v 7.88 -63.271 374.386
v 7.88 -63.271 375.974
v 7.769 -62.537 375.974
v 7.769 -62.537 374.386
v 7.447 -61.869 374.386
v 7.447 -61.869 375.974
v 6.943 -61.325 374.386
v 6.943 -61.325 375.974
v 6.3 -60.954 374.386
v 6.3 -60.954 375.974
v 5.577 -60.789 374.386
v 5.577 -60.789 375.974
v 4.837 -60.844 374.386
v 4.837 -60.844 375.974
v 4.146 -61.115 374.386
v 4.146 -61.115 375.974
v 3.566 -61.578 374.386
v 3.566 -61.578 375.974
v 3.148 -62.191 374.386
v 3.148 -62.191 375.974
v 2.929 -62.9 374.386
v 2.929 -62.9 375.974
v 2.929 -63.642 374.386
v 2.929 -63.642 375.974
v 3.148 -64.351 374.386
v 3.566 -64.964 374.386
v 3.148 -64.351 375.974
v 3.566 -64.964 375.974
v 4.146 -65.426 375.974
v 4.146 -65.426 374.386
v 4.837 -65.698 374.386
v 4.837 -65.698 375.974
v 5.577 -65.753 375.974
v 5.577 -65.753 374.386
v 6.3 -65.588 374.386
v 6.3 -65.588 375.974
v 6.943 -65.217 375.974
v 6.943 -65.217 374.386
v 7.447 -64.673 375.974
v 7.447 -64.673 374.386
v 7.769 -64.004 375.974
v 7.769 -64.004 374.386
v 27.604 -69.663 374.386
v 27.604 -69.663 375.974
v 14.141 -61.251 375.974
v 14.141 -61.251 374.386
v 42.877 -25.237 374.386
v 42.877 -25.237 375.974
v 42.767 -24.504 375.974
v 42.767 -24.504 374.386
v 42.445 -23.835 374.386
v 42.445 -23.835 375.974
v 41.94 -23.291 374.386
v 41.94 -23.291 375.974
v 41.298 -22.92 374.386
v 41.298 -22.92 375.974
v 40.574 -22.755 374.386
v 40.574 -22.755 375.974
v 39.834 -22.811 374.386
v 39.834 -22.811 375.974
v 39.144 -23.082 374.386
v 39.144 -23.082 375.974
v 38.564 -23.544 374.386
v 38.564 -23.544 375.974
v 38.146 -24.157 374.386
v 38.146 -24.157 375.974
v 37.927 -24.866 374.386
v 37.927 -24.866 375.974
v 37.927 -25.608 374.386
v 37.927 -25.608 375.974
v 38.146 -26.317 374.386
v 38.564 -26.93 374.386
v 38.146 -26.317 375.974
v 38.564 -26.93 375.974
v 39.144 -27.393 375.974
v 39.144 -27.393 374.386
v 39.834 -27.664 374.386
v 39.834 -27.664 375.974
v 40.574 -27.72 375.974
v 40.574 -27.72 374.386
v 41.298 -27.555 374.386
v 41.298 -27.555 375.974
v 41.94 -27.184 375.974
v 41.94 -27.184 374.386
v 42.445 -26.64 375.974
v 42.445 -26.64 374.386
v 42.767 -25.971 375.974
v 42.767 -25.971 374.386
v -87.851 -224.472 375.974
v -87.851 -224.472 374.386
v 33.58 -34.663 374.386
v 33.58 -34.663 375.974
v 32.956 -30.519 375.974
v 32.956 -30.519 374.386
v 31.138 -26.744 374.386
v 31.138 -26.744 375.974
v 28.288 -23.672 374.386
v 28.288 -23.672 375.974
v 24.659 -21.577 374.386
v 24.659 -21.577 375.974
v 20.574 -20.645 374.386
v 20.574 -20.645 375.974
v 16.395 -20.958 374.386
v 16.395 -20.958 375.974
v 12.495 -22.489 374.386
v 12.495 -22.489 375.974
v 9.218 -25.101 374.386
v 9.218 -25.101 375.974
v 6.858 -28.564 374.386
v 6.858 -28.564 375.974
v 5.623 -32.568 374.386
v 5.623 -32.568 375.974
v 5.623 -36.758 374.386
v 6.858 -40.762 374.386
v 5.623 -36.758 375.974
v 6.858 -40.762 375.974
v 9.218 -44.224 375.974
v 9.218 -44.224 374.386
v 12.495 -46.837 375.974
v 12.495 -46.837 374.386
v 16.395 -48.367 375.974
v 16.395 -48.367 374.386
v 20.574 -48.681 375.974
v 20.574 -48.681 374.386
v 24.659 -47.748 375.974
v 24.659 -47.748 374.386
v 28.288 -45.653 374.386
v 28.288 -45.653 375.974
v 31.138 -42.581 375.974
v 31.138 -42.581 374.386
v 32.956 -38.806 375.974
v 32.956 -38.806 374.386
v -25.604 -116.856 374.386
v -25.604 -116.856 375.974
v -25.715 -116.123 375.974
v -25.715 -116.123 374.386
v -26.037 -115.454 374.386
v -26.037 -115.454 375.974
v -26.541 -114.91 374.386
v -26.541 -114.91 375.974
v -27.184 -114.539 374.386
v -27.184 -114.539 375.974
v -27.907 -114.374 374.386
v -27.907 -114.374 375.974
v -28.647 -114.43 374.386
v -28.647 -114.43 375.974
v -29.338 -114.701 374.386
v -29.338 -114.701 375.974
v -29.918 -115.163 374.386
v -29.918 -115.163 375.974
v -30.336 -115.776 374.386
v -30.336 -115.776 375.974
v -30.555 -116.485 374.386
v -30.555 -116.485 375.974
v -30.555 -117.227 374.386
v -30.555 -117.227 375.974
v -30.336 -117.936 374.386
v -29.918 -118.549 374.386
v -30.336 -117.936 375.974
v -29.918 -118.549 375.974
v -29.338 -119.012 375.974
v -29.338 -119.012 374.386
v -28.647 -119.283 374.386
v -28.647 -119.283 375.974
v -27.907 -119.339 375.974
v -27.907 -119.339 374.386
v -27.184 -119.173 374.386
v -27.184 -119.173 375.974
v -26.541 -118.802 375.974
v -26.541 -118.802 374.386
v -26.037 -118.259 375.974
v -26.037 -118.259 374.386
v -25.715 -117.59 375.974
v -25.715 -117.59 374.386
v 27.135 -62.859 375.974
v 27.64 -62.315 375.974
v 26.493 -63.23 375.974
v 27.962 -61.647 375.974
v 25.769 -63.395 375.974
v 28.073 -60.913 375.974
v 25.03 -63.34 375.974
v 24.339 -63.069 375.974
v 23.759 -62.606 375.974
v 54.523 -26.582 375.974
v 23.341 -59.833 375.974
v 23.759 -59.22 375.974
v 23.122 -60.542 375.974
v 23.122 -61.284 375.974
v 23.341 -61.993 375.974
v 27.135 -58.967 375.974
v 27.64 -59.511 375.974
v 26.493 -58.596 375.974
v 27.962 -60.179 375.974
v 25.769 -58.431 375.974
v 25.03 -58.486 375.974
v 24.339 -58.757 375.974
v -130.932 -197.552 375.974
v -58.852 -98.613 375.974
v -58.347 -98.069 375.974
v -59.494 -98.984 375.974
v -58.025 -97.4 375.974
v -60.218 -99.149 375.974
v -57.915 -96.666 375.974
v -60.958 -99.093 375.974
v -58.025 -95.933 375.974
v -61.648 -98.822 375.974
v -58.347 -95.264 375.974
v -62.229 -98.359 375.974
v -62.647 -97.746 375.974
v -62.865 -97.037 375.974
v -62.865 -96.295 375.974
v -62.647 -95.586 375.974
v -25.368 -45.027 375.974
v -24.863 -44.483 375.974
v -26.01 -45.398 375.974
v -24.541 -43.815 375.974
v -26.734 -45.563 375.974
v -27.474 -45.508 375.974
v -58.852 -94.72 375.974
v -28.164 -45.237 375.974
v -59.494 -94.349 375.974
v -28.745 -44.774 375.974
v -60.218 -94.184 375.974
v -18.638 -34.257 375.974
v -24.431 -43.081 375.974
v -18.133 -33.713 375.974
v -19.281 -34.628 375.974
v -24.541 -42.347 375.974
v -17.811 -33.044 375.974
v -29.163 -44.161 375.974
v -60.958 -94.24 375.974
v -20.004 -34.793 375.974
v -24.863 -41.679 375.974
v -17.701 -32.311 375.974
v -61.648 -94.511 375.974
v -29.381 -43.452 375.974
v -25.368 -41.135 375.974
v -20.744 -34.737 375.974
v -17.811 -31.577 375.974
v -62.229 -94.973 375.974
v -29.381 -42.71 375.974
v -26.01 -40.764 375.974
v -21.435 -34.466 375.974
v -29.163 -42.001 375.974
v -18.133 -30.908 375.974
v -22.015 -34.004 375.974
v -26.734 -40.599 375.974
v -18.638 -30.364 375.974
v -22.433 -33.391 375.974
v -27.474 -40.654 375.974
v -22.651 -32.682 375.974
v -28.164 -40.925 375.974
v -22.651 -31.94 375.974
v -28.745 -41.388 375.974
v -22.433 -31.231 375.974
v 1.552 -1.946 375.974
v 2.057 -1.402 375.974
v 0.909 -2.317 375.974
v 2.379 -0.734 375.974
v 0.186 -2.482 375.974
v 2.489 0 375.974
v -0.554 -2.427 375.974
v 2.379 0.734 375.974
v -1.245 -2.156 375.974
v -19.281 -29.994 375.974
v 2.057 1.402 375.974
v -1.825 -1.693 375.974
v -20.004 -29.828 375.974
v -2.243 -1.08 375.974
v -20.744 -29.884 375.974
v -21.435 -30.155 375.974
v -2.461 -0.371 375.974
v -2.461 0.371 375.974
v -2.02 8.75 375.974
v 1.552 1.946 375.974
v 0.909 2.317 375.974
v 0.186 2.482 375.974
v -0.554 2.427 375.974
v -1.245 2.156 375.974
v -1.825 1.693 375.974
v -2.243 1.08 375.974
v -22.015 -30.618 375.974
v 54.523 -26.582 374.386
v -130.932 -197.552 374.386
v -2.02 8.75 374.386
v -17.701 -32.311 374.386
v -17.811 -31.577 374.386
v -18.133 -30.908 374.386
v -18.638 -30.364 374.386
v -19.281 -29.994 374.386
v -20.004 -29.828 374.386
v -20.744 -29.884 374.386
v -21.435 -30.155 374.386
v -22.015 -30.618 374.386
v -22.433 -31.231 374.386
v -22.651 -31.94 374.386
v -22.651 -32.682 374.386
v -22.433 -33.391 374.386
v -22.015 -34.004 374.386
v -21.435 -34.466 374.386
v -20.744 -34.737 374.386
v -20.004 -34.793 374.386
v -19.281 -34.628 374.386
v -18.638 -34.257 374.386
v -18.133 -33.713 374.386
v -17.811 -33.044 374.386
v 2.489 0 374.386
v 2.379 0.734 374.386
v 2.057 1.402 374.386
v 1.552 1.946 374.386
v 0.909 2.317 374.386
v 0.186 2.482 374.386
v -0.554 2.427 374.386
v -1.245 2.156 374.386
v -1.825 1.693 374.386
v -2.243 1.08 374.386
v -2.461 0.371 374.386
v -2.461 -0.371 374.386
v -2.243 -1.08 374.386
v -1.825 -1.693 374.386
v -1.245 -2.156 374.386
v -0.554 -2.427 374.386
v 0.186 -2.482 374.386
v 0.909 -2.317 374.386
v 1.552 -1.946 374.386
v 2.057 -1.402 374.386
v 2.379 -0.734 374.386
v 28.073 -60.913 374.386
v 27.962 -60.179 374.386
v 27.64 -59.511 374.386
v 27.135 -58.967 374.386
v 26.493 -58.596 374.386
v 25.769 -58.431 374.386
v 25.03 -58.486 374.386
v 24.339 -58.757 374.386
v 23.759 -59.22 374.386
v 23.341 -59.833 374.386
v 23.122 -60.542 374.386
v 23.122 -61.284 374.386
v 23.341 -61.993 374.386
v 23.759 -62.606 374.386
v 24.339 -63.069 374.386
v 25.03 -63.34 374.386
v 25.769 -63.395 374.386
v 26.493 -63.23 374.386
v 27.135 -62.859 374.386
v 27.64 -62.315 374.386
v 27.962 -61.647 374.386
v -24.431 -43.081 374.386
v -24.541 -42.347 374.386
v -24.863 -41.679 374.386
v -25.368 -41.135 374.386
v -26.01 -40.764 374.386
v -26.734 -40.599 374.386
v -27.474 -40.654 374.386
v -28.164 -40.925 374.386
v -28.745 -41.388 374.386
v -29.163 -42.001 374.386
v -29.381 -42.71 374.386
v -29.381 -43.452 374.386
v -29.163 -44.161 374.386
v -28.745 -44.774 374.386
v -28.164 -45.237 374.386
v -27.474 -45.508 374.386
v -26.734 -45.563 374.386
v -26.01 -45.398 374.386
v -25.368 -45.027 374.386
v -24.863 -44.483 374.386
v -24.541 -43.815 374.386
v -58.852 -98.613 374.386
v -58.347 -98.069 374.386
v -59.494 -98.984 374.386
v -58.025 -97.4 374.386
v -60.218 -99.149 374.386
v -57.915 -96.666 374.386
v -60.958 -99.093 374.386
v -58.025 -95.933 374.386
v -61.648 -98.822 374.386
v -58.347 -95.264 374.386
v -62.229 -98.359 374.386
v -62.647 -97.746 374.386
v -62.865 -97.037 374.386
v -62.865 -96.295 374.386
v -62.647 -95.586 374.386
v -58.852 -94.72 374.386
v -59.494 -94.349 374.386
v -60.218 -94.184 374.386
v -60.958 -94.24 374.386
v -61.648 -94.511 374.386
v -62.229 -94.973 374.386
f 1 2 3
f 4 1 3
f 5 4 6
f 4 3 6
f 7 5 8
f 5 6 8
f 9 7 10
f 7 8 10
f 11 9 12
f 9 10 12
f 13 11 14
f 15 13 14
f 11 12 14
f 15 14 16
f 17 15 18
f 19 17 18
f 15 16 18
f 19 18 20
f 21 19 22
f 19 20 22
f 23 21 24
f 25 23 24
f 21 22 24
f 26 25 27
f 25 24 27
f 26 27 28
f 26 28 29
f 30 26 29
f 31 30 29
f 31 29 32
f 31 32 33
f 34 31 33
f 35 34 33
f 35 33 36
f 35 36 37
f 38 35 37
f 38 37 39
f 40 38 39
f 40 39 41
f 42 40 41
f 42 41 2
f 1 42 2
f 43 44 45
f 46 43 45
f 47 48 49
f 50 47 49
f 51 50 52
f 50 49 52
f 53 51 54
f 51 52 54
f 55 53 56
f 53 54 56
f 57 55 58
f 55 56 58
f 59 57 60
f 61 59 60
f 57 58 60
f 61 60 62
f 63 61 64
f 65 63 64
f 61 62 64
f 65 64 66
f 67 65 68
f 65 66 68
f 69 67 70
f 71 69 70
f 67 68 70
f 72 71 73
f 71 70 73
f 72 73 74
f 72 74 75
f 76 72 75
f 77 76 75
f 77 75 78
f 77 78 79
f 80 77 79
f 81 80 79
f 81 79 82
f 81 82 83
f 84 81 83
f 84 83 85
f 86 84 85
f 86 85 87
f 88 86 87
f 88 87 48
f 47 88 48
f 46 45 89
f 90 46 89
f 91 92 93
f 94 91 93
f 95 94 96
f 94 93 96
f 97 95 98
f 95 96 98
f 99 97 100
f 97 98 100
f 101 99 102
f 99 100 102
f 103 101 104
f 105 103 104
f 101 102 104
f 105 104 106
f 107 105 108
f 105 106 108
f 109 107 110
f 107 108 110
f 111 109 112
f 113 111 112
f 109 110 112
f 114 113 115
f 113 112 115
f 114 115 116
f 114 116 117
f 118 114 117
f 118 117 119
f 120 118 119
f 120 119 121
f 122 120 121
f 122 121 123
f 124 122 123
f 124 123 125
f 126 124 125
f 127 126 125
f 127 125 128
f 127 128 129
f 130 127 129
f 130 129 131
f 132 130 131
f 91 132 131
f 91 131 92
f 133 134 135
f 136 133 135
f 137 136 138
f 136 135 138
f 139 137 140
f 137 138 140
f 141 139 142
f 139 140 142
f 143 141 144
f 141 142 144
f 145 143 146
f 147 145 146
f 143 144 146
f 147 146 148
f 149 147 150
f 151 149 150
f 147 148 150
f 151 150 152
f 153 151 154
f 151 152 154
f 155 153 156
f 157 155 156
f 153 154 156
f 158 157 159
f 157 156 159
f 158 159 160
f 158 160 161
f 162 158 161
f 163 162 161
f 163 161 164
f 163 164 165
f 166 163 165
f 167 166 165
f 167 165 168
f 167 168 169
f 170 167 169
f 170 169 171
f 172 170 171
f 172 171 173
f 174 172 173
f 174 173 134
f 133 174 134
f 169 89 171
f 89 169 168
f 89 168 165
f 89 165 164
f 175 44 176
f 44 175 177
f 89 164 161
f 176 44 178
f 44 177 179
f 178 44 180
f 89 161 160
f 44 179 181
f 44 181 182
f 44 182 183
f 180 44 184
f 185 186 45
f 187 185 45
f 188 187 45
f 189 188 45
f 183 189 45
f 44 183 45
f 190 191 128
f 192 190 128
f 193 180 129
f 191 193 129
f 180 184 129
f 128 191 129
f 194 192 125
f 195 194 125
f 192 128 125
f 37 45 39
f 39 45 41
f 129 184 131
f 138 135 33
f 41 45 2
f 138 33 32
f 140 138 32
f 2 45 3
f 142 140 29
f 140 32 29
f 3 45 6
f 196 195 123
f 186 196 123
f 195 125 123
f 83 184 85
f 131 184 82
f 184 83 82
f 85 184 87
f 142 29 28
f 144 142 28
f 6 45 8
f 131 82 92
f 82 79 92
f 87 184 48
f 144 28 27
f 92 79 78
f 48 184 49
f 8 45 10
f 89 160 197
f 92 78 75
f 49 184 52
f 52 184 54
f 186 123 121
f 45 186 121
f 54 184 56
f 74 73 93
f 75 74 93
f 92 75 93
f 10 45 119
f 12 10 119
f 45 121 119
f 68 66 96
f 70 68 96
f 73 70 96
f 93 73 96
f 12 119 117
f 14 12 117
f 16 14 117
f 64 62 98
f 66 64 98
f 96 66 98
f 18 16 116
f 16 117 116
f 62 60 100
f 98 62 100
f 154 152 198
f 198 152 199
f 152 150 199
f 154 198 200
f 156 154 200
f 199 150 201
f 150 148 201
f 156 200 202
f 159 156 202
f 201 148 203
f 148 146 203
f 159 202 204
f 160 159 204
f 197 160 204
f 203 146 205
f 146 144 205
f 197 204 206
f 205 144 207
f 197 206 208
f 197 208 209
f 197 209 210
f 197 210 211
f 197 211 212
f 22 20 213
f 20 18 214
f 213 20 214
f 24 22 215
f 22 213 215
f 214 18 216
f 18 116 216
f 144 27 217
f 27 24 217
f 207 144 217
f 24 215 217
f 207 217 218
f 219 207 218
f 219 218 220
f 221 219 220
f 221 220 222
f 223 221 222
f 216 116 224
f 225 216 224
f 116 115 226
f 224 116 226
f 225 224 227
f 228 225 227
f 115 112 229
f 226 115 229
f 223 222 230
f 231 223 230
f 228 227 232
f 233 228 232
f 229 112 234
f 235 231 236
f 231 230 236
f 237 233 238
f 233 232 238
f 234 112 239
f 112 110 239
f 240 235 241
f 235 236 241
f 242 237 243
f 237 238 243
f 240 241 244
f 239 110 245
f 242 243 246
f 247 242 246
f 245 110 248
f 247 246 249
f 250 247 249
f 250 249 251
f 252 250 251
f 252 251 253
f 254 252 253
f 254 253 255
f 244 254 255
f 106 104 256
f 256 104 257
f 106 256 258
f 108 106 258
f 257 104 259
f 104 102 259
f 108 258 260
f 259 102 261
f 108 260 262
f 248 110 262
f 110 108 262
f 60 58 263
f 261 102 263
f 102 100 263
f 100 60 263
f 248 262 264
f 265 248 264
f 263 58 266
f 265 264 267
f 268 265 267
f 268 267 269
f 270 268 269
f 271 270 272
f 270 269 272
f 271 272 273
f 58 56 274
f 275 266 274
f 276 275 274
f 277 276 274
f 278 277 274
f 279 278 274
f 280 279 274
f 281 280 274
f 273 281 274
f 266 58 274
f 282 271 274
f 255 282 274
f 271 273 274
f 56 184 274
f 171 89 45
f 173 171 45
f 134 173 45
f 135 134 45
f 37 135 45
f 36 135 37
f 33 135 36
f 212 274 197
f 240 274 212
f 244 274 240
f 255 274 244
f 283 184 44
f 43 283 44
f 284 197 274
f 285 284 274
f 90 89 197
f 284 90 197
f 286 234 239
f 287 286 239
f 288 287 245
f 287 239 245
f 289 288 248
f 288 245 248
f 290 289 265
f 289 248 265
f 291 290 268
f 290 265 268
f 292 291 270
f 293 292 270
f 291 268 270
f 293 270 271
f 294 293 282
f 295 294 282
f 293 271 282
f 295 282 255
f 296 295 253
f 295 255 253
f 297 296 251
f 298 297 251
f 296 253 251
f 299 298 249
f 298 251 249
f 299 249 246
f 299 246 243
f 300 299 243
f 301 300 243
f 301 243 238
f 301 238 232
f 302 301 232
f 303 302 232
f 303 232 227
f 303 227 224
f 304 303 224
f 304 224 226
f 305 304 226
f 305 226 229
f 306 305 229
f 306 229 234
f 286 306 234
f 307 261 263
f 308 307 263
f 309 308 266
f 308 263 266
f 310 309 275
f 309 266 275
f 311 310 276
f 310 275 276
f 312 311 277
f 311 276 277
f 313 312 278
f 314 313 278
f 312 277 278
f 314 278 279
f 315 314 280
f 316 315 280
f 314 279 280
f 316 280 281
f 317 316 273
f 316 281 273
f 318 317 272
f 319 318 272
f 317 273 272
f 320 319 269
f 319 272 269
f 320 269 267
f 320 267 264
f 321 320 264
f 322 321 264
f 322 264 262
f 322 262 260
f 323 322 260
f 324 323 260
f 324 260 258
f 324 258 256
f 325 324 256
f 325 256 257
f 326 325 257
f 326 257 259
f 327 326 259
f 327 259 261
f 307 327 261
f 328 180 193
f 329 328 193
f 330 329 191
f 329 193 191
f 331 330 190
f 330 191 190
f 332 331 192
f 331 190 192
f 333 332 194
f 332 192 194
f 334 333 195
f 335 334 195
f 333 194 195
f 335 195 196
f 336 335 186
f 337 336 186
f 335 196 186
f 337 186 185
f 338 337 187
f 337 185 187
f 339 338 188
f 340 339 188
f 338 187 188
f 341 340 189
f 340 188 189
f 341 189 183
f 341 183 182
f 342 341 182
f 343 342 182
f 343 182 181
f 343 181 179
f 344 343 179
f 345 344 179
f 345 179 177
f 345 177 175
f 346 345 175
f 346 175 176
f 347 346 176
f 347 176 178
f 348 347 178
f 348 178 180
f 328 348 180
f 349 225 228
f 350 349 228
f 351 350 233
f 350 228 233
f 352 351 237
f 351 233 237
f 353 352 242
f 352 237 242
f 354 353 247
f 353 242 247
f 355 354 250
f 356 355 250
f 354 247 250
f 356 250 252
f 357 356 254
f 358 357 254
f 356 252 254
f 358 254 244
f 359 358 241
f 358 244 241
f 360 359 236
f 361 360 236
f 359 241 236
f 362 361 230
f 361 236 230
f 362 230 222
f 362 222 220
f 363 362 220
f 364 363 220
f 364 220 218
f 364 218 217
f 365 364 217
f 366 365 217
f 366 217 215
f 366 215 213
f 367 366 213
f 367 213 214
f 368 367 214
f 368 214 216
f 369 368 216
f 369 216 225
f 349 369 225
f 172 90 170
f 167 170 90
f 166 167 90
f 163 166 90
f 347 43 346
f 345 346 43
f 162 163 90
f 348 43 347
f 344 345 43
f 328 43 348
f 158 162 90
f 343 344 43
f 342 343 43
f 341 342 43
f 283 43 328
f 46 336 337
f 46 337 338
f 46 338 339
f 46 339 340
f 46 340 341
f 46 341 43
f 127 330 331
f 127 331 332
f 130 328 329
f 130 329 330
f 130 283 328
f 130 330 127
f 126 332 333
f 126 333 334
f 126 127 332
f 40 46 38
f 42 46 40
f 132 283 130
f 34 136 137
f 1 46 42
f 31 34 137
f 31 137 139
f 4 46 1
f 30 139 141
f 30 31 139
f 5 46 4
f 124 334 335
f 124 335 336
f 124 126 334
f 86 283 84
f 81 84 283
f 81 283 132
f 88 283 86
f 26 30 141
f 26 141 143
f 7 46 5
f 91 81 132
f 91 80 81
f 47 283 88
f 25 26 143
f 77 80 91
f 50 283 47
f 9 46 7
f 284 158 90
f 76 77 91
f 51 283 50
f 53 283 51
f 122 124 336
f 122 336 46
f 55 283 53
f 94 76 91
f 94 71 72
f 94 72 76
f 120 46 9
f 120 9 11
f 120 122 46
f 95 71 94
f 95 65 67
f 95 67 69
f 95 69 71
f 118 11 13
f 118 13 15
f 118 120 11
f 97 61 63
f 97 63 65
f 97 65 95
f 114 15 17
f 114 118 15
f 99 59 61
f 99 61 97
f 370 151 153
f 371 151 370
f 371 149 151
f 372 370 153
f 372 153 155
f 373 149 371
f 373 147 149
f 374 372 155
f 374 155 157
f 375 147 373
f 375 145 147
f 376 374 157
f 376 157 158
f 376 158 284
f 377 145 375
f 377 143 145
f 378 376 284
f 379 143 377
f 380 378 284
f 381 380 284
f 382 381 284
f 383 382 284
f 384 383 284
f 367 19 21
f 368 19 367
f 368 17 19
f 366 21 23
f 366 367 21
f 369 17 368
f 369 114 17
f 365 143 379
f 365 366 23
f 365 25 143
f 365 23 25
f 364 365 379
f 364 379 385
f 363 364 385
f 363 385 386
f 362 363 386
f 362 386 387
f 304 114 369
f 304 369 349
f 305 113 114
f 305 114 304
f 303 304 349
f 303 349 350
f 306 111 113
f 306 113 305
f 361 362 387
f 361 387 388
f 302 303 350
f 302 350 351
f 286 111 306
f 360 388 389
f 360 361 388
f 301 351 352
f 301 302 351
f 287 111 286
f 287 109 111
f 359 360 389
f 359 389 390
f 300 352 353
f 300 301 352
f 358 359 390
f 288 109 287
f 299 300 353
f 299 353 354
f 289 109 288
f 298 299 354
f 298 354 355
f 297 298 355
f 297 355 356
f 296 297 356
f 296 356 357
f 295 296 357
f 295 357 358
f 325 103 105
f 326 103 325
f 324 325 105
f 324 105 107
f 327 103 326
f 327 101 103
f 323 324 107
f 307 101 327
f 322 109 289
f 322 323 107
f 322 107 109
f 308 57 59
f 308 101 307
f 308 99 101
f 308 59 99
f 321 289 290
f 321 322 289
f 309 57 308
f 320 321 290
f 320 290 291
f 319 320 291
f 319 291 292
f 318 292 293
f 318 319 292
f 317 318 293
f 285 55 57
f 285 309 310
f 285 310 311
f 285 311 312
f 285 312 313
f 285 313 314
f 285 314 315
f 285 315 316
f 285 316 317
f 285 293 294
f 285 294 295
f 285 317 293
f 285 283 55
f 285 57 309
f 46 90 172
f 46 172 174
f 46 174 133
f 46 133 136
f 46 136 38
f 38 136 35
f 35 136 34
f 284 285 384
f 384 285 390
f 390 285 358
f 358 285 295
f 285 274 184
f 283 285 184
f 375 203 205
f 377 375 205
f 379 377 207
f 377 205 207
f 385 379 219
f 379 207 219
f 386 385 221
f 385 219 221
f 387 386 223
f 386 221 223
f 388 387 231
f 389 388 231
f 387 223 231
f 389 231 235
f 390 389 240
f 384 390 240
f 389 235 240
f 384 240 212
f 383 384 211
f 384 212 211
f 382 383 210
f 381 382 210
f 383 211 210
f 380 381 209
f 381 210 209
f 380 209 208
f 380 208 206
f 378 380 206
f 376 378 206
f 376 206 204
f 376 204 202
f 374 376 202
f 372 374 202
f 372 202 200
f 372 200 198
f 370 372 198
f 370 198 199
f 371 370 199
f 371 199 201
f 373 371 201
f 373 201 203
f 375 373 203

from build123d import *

# Parameters (mm, degrees)
BOSS_EXTRUDE1_DEPTH    = 1.5875
F_10_CLEARANCE_HOLE1_D = 4.9784
SKETCH5_R              = 14.057169334
CUT_EXTRUDE1_DEPTH     = 2.54


with BuildPart() as part:
    # Sketch2 → Boss-Extrude1 (new body)
    with BuildSketch(Plane(origin=(0, 0, 375.973880443), x_dir=(-1, 0, 0), z_dir=(0, 0, -1))):
        Polygon((-54.523488721, -26.582274219), (-27.603590087, -69.663117497), (-14.140826563, -61.250649173), (87.851311274, -224.47218895), (130.932154551, -197.552290315), (2.020118081, 8.750092739), align=None)
    extrude(amount=BOSS_EXTRUDE1_DEPTH)

    # #10 Clearance Hole1 (through all)
    with Locations(Plane(origin=(0, 0, 374.386380443), x_dir=(-1, 0, 0), z_dir=(0, 0, -1))):
        with Locations((-5.390733824, -63.270767254), (-25.583472007, -60.913024757), (-40.388290572, -25.23740497), (0, 0), (20.189923976, -32.310632459), (26.919898634, -43.080843278), (60.403864812, -96.66639049), (28.093232354, -116.856314466)):
            Hole(F_10_CLEARANCE_HOLE1_D / 2)

    # Sketch5 → Cut-Extrude1 (cut)
    with BuildSketch(Plane.XY.offset(375.973880443)):
        with Locations((19.523118196, -34.66274681)):
            Circle(SKETCH5_R)
    extrude(amount=-CUT_EXTRUDE1_DEPTH, mode=Mode.SUBTRACT)


solid = part.part
